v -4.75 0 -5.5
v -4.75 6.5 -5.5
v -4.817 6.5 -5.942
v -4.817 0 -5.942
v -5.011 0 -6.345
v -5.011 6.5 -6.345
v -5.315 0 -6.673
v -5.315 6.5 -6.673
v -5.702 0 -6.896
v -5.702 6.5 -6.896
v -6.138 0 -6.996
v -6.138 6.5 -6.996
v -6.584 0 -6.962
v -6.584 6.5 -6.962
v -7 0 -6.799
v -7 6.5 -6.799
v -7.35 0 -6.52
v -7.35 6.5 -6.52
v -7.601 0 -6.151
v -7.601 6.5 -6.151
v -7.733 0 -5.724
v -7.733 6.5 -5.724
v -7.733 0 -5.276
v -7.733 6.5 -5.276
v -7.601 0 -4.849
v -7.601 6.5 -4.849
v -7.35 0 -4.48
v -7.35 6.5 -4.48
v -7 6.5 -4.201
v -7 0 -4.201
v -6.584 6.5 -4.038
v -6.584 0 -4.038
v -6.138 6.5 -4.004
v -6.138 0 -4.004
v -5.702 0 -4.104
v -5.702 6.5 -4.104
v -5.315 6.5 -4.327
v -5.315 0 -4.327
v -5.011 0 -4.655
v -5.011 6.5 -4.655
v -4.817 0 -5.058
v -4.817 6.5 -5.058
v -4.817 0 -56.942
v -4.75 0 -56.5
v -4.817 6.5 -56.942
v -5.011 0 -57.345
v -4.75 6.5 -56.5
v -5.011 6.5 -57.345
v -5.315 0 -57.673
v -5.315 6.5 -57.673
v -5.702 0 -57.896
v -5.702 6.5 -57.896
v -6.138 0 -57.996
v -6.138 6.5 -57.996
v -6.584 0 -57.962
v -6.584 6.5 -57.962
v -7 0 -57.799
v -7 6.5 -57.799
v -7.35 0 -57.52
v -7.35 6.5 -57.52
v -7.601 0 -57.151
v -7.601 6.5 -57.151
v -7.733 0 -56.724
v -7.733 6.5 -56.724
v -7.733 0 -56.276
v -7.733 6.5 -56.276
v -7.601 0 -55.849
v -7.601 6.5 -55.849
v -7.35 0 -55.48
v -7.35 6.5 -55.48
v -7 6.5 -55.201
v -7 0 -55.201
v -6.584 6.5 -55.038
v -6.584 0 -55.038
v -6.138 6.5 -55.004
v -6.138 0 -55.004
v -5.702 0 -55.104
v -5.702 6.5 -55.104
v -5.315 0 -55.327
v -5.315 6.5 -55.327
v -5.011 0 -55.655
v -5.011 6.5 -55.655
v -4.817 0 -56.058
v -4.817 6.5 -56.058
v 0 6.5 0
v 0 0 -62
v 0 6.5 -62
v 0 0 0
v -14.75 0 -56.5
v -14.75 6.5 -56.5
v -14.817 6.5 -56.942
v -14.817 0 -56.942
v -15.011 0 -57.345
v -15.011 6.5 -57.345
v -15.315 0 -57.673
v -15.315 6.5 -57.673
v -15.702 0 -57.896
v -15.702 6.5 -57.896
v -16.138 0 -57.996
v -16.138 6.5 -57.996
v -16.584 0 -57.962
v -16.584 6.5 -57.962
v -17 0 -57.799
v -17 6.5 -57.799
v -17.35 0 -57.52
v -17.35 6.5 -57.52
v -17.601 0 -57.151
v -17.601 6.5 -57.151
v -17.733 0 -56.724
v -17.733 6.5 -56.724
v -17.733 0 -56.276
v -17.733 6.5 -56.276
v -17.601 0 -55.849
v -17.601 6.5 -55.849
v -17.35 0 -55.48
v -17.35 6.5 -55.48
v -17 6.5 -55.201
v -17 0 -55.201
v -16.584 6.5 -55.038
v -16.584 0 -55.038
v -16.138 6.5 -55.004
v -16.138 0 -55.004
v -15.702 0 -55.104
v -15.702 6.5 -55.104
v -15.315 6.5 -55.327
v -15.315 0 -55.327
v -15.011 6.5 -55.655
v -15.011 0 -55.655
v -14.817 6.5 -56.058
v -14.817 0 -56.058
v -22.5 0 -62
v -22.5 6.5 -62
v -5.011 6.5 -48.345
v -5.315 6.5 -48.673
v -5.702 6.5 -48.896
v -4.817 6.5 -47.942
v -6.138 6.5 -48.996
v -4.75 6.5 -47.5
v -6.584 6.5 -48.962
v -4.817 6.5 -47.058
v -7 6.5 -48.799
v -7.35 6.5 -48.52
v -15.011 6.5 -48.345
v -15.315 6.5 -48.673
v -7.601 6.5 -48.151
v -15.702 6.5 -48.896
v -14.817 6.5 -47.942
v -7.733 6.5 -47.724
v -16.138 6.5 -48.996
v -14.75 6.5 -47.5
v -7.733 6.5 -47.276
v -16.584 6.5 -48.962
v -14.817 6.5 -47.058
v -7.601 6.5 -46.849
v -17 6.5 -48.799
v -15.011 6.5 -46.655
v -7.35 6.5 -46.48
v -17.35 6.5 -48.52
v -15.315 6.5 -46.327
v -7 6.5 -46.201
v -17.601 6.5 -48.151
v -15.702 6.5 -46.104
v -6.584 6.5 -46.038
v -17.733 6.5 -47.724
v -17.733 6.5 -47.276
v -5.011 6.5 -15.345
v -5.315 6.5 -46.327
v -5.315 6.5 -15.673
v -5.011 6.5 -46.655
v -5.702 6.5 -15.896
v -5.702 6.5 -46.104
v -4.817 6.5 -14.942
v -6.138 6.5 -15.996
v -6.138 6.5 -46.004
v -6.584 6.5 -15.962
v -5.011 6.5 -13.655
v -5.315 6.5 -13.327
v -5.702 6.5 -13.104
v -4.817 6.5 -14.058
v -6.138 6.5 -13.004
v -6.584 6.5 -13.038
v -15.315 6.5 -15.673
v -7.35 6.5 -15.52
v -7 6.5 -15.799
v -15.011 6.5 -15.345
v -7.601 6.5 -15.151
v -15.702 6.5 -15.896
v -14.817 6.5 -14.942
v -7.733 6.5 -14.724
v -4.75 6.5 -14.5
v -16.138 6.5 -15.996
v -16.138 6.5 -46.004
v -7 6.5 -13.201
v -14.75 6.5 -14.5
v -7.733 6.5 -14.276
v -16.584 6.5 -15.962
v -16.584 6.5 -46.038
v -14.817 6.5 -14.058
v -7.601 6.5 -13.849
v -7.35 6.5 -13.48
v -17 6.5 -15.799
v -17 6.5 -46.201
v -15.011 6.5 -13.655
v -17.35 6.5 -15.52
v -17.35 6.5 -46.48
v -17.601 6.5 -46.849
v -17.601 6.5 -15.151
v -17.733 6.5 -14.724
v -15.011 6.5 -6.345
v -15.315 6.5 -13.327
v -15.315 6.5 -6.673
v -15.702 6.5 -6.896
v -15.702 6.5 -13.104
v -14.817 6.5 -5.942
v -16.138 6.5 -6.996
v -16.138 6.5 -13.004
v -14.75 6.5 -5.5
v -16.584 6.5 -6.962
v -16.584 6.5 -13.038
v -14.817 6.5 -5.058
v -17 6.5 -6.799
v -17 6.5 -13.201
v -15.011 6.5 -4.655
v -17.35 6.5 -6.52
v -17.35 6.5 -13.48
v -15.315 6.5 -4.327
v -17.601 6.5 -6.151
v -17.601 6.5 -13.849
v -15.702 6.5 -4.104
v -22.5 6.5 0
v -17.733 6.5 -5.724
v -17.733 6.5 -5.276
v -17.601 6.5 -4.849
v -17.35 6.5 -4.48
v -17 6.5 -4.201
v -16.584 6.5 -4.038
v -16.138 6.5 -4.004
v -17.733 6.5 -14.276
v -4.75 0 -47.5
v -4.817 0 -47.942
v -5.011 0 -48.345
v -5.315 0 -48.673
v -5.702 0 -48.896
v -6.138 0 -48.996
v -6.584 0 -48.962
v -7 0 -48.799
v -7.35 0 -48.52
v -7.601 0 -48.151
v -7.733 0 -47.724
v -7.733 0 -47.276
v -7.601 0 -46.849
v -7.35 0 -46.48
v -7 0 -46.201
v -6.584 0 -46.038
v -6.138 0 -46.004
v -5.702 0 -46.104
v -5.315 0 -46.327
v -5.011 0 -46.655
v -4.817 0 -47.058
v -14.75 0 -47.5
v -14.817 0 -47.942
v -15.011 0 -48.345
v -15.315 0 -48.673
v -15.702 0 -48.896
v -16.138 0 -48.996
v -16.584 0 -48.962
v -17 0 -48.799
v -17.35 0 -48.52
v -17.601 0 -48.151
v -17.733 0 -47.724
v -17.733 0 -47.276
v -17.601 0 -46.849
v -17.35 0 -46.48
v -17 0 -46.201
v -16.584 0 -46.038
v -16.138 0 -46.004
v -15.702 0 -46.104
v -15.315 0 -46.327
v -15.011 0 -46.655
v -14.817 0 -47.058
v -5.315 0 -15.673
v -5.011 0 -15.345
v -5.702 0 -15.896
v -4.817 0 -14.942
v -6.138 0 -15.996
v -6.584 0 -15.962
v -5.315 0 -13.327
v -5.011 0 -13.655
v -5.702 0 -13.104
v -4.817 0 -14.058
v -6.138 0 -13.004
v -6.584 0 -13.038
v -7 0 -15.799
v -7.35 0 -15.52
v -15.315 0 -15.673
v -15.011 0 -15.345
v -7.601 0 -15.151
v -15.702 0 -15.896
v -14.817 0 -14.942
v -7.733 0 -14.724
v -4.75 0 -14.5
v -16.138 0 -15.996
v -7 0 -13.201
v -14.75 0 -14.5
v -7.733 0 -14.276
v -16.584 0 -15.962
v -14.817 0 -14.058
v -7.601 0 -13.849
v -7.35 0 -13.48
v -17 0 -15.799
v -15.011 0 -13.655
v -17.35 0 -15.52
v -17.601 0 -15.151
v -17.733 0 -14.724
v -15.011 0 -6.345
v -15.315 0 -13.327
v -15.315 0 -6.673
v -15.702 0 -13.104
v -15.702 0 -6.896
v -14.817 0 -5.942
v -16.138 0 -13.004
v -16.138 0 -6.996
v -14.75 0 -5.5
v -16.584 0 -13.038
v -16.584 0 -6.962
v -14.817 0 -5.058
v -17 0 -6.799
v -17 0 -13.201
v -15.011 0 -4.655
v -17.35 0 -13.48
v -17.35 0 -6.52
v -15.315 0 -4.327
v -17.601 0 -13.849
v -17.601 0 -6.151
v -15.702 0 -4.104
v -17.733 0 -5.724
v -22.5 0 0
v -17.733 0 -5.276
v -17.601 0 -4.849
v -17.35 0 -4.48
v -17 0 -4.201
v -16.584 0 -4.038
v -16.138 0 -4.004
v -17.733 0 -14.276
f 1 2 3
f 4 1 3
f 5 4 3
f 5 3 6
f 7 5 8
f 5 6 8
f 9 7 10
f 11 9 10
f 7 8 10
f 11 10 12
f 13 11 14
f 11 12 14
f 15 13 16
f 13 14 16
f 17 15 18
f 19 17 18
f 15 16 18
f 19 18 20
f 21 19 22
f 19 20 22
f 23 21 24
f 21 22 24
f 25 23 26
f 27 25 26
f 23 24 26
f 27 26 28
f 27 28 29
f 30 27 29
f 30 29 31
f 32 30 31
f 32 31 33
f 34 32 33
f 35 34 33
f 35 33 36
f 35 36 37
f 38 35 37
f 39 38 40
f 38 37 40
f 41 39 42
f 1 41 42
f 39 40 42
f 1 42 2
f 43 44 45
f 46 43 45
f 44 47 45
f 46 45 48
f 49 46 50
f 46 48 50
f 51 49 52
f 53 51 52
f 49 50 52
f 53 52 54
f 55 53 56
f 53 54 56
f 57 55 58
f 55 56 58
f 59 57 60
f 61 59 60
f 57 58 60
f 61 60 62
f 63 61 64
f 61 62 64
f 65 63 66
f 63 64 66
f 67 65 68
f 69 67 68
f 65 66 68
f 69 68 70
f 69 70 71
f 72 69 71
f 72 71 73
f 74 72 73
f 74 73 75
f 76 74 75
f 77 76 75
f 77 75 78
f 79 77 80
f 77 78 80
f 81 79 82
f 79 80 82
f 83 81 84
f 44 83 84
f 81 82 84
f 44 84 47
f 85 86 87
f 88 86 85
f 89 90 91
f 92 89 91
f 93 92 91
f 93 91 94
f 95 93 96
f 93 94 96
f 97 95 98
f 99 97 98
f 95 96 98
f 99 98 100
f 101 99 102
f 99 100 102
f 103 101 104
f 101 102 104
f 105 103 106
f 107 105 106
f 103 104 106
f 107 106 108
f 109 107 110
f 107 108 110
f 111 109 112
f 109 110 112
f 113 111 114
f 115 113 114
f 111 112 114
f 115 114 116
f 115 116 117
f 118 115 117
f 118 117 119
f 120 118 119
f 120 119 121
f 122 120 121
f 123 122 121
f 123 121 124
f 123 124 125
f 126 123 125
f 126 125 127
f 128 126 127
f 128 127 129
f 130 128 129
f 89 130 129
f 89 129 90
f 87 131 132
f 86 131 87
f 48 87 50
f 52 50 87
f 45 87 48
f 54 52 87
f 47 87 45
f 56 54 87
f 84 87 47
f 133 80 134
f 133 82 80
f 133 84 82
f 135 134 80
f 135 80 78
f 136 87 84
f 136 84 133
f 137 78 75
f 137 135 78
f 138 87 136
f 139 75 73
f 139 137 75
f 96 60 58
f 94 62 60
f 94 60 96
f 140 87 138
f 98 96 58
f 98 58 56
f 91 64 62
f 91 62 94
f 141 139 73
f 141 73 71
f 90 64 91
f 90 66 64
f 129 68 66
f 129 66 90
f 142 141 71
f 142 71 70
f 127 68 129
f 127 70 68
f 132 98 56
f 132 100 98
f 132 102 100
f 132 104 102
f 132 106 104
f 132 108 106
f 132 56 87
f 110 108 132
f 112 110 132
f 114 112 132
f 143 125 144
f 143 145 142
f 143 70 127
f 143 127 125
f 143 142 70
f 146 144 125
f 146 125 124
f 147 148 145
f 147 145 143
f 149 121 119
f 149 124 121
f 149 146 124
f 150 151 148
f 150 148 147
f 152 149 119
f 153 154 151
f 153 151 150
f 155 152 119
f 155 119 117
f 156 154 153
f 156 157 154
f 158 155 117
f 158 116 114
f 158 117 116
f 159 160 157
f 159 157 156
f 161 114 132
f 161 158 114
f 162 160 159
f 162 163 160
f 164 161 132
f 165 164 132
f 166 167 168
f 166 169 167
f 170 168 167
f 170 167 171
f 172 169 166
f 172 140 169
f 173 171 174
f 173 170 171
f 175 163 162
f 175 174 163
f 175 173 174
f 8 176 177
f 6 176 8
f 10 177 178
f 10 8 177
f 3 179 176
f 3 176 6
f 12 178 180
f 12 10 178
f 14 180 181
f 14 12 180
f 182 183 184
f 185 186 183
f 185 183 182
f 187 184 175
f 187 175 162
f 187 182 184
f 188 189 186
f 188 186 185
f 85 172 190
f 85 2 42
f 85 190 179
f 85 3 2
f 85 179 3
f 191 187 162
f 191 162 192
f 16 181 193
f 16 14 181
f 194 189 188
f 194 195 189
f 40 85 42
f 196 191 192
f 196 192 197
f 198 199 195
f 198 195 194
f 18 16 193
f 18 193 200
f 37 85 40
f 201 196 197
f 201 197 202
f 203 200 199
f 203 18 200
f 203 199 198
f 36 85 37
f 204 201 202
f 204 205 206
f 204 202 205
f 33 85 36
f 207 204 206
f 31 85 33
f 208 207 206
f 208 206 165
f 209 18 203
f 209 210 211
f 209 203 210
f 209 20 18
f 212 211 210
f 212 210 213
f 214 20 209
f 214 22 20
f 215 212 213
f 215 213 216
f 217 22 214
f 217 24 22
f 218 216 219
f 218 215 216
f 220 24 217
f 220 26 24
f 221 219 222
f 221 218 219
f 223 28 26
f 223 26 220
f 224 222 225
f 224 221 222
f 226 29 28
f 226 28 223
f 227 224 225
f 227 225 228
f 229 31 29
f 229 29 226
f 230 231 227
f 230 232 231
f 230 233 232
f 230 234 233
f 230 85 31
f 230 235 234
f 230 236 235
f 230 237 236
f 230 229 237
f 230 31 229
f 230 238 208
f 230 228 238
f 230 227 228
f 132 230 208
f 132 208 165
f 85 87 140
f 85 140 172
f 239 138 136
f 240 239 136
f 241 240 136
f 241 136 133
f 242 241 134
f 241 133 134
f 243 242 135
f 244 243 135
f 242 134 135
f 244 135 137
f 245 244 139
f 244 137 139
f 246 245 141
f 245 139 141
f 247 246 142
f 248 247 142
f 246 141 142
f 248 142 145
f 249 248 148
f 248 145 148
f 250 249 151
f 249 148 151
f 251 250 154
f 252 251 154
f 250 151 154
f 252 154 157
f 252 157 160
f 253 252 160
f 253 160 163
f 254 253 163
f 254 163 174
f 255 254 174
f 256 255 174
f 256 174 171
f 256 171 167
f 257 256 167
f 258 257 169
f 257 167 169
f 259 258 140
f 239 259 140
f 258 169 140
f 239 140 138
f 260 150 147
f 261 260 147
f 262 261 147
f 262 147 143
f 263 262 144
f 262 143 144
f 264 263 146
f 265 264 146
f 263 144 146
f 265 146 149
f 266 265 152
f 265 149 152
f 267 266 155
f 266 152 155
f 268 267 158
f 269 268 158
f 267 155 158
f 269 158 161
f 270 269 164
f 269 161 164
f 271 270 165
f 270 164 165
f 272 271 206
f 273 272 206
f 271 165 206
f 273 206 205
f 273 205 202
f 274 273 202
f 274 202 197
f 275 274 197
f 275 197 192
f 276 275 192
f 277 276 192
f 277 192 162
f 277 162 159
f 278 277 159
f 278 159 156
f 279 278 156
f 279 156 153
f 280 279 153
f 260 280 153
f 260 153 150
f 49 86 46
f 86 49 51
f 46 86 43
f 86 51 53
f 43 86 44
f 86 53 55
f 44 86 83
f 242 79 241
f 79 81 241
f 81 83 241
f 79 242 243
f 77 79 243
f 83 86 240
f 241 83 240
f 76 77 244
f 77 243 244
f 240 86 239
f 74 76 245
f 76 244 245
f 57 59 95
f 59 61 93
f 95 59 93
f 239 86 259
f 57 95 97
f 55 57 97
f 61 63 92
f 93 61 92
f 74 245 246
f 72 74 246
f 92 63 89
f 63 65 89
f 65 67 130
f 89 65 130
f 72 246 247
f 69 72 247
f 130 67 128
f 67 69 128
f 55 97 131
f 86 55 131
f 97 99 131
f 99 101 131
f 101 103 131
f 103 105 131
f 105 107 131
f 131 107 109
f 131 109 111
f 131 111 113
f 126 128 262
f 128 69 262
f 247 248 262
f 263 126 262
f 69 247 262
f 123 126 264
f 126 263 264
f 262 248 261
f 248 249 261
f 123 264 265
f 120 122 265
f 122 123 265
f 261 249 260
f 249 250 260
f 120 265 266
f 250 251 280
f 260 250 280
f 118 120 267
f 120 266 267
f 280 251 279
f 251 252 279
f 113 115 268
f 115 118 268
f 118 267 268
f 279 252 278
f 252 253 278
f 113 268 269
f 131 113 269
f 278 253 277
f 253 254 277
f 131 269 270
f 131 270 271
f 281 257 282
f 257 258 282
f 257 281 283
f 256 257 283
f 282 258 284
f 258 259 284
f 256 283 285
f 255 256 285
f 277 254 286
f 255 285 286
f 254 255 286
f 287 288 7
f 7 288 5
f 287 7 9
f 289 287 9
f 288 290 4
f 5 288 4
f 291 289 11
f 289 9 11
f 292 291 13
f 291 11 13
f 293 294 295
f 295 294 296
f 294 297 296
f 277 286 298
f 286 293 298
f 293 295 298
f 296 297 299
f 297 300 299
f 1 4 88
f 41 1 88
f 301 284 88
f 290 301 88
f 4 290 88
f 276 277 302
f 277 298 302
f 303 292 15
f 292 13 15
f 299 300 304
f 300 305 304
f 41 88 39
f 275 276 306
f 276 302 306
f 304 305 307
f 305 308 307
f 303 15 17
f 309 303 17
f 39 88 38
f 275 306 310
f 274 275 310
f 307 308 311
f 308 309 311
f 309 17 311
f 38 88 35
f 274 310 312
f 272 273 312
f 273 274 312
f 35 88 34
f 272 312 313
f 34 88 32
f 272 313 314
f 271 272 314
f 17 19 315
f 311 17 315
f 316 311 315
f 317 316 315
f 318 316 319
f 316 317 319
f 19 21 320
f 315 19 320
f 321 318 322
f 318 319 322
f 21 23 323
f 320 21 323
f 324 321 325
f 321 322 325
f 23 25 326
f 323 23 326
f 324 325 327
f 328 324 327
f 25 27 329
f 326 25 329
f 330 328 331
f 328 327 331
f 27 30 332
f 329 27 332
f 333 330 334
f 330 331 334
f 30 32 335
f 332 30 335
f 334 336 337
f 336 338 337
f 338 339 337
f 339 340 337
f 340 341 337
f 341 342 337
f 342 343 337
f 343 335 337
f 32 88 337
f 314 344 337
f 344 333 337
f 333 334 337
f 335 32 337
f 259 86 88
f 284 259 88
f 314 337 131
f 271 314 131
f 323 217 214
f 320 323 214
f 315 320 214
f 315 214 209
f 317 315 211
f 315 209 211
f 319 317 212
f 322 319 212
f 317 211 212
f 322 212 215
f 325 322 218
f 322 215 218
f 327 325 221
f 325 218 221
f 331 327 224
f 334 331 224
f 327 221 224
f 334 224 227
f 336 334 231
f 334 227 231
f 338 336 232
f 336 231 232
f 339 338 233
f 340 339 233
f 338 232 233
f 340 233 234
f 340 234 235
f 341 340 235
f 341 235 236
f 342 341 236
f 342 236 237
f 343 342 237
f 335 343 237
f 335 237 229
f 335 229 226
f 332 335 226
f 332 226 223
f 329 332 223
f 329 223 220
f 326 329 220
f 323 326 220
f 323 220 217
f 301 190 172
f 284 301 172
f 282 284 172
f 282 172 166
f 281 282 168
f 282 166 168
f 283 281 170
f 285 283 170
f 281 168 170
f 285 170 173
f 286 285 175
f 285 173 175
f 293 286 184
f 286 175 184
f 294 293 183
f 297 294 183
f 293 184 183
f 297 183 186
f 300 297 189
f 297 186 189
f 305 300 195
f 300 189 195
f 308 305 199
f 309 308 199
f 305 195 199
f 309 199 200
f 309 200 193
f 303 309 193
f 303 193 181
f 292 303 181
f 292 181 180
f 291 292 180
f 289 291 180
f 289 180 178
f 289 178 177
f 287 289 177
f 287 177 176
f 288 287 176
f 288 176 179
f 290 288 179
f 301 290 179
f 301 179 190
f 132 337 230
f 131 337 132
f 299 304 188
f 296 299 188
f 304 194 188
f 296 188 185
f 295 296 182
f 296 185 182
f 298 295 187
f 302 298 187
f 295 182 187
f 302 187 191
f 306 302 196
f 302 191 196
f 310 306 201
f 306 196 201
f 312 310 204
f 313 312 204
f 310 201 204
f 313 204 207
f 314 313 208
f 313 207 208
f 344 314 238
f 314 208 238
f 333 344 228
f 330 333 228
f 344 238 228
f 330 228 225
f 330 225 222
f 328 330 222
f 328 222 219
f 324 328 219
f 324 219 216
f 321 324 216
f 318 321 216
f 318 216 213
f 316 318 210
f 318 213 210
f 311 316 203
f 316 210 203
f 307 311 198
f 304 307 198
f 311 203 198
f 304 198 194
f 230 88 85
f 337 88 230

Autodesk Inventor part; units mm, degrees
ref_plane "YZ Plane" through (0, 0, 0) normal (1, 0, 0) x (0, 1, 0)
ref_plane "XZ Plane" through (0, 0, 0) normal (0, 1, 0) x (-1, 0, 0)
ref_plane "XY Plane" through (0, 0, 0) normal (0, 0, 1) x (1, 0, 0)
sketch "Sketch1" plane through (0, 0, 0) normal (0, 1, 0) x (-1, 0, 0)
  line L0 (0, 0) -> (22.5, 0)
  line L1 (22.5, 0) -> (22.5, -62)
  line L2 (22.5, -62) -> (0, -62)
  line L3 (0, -62) -> (0, 0)
  dimension "d0" = 22.5
  dimension "d1" = 62
extrude "Extrusion1" add sketch "Sketch1" along normal blind 6.5
sketch "Sketch2" plane through (0, 6.5, 0) normal (0, 1, 0) x (1, 0, 0)
  line L0 (0, 62) -> (-22.5, 62) projected
  line L1 (-22.5, 62) -> (-22.5, 0) projected
  circle A0 centre (-16.25, 56.5) radius 1.5
  circle A1 centre (-16.25, 47.5) radius 1.5
  circle A2 centre (-6.25, 56.5) radius 1.5
  circle A3 centre (-6.25, 47.5) radius 1.5
  circle A4 centre (-16.25, 14.5) radius 1.5
  circle A5 centre (-16.25, 5.5) radius 1.5
  circle A6 centre (-6.25, 14.5) radius 1.5
  circle A7 centre (-6.25, 5.5) radius 1.5
  line L2 (-16.25, 56.5) -> (-6.25, 56.5) construction
  line L3 (-16.25, 56.5) -> (-6.25, 47.5) construction
  line L4 (-16.25, 47.5) -> (-6.25, 56.5) construction
  line L5 (-16.25, 14.5) -> (-6.25, 5.5) construction
  line L6 (-6.25, 14.5) -> (-16.25, 5.5) construction
  line L7 (-11.25, 52) -> (-11.25, 10) construction
  point P0 (-11.25, 56.5)
  point P1 (-11.25, 62)
  point P2 (-11.25, 31)
  point P3 (-22.5, 31)
  dimension "d5" = 3
  dimension "d6" = 9
  dimension "d7" = 10
  dimension "d8" = 9
  dimension "d9" = 42
extrude "Extrusion2" cut sketch "Sketch2" against normal through all
equation "\"d8\" = d6"
properties part number "x_iddler_right_cap"
